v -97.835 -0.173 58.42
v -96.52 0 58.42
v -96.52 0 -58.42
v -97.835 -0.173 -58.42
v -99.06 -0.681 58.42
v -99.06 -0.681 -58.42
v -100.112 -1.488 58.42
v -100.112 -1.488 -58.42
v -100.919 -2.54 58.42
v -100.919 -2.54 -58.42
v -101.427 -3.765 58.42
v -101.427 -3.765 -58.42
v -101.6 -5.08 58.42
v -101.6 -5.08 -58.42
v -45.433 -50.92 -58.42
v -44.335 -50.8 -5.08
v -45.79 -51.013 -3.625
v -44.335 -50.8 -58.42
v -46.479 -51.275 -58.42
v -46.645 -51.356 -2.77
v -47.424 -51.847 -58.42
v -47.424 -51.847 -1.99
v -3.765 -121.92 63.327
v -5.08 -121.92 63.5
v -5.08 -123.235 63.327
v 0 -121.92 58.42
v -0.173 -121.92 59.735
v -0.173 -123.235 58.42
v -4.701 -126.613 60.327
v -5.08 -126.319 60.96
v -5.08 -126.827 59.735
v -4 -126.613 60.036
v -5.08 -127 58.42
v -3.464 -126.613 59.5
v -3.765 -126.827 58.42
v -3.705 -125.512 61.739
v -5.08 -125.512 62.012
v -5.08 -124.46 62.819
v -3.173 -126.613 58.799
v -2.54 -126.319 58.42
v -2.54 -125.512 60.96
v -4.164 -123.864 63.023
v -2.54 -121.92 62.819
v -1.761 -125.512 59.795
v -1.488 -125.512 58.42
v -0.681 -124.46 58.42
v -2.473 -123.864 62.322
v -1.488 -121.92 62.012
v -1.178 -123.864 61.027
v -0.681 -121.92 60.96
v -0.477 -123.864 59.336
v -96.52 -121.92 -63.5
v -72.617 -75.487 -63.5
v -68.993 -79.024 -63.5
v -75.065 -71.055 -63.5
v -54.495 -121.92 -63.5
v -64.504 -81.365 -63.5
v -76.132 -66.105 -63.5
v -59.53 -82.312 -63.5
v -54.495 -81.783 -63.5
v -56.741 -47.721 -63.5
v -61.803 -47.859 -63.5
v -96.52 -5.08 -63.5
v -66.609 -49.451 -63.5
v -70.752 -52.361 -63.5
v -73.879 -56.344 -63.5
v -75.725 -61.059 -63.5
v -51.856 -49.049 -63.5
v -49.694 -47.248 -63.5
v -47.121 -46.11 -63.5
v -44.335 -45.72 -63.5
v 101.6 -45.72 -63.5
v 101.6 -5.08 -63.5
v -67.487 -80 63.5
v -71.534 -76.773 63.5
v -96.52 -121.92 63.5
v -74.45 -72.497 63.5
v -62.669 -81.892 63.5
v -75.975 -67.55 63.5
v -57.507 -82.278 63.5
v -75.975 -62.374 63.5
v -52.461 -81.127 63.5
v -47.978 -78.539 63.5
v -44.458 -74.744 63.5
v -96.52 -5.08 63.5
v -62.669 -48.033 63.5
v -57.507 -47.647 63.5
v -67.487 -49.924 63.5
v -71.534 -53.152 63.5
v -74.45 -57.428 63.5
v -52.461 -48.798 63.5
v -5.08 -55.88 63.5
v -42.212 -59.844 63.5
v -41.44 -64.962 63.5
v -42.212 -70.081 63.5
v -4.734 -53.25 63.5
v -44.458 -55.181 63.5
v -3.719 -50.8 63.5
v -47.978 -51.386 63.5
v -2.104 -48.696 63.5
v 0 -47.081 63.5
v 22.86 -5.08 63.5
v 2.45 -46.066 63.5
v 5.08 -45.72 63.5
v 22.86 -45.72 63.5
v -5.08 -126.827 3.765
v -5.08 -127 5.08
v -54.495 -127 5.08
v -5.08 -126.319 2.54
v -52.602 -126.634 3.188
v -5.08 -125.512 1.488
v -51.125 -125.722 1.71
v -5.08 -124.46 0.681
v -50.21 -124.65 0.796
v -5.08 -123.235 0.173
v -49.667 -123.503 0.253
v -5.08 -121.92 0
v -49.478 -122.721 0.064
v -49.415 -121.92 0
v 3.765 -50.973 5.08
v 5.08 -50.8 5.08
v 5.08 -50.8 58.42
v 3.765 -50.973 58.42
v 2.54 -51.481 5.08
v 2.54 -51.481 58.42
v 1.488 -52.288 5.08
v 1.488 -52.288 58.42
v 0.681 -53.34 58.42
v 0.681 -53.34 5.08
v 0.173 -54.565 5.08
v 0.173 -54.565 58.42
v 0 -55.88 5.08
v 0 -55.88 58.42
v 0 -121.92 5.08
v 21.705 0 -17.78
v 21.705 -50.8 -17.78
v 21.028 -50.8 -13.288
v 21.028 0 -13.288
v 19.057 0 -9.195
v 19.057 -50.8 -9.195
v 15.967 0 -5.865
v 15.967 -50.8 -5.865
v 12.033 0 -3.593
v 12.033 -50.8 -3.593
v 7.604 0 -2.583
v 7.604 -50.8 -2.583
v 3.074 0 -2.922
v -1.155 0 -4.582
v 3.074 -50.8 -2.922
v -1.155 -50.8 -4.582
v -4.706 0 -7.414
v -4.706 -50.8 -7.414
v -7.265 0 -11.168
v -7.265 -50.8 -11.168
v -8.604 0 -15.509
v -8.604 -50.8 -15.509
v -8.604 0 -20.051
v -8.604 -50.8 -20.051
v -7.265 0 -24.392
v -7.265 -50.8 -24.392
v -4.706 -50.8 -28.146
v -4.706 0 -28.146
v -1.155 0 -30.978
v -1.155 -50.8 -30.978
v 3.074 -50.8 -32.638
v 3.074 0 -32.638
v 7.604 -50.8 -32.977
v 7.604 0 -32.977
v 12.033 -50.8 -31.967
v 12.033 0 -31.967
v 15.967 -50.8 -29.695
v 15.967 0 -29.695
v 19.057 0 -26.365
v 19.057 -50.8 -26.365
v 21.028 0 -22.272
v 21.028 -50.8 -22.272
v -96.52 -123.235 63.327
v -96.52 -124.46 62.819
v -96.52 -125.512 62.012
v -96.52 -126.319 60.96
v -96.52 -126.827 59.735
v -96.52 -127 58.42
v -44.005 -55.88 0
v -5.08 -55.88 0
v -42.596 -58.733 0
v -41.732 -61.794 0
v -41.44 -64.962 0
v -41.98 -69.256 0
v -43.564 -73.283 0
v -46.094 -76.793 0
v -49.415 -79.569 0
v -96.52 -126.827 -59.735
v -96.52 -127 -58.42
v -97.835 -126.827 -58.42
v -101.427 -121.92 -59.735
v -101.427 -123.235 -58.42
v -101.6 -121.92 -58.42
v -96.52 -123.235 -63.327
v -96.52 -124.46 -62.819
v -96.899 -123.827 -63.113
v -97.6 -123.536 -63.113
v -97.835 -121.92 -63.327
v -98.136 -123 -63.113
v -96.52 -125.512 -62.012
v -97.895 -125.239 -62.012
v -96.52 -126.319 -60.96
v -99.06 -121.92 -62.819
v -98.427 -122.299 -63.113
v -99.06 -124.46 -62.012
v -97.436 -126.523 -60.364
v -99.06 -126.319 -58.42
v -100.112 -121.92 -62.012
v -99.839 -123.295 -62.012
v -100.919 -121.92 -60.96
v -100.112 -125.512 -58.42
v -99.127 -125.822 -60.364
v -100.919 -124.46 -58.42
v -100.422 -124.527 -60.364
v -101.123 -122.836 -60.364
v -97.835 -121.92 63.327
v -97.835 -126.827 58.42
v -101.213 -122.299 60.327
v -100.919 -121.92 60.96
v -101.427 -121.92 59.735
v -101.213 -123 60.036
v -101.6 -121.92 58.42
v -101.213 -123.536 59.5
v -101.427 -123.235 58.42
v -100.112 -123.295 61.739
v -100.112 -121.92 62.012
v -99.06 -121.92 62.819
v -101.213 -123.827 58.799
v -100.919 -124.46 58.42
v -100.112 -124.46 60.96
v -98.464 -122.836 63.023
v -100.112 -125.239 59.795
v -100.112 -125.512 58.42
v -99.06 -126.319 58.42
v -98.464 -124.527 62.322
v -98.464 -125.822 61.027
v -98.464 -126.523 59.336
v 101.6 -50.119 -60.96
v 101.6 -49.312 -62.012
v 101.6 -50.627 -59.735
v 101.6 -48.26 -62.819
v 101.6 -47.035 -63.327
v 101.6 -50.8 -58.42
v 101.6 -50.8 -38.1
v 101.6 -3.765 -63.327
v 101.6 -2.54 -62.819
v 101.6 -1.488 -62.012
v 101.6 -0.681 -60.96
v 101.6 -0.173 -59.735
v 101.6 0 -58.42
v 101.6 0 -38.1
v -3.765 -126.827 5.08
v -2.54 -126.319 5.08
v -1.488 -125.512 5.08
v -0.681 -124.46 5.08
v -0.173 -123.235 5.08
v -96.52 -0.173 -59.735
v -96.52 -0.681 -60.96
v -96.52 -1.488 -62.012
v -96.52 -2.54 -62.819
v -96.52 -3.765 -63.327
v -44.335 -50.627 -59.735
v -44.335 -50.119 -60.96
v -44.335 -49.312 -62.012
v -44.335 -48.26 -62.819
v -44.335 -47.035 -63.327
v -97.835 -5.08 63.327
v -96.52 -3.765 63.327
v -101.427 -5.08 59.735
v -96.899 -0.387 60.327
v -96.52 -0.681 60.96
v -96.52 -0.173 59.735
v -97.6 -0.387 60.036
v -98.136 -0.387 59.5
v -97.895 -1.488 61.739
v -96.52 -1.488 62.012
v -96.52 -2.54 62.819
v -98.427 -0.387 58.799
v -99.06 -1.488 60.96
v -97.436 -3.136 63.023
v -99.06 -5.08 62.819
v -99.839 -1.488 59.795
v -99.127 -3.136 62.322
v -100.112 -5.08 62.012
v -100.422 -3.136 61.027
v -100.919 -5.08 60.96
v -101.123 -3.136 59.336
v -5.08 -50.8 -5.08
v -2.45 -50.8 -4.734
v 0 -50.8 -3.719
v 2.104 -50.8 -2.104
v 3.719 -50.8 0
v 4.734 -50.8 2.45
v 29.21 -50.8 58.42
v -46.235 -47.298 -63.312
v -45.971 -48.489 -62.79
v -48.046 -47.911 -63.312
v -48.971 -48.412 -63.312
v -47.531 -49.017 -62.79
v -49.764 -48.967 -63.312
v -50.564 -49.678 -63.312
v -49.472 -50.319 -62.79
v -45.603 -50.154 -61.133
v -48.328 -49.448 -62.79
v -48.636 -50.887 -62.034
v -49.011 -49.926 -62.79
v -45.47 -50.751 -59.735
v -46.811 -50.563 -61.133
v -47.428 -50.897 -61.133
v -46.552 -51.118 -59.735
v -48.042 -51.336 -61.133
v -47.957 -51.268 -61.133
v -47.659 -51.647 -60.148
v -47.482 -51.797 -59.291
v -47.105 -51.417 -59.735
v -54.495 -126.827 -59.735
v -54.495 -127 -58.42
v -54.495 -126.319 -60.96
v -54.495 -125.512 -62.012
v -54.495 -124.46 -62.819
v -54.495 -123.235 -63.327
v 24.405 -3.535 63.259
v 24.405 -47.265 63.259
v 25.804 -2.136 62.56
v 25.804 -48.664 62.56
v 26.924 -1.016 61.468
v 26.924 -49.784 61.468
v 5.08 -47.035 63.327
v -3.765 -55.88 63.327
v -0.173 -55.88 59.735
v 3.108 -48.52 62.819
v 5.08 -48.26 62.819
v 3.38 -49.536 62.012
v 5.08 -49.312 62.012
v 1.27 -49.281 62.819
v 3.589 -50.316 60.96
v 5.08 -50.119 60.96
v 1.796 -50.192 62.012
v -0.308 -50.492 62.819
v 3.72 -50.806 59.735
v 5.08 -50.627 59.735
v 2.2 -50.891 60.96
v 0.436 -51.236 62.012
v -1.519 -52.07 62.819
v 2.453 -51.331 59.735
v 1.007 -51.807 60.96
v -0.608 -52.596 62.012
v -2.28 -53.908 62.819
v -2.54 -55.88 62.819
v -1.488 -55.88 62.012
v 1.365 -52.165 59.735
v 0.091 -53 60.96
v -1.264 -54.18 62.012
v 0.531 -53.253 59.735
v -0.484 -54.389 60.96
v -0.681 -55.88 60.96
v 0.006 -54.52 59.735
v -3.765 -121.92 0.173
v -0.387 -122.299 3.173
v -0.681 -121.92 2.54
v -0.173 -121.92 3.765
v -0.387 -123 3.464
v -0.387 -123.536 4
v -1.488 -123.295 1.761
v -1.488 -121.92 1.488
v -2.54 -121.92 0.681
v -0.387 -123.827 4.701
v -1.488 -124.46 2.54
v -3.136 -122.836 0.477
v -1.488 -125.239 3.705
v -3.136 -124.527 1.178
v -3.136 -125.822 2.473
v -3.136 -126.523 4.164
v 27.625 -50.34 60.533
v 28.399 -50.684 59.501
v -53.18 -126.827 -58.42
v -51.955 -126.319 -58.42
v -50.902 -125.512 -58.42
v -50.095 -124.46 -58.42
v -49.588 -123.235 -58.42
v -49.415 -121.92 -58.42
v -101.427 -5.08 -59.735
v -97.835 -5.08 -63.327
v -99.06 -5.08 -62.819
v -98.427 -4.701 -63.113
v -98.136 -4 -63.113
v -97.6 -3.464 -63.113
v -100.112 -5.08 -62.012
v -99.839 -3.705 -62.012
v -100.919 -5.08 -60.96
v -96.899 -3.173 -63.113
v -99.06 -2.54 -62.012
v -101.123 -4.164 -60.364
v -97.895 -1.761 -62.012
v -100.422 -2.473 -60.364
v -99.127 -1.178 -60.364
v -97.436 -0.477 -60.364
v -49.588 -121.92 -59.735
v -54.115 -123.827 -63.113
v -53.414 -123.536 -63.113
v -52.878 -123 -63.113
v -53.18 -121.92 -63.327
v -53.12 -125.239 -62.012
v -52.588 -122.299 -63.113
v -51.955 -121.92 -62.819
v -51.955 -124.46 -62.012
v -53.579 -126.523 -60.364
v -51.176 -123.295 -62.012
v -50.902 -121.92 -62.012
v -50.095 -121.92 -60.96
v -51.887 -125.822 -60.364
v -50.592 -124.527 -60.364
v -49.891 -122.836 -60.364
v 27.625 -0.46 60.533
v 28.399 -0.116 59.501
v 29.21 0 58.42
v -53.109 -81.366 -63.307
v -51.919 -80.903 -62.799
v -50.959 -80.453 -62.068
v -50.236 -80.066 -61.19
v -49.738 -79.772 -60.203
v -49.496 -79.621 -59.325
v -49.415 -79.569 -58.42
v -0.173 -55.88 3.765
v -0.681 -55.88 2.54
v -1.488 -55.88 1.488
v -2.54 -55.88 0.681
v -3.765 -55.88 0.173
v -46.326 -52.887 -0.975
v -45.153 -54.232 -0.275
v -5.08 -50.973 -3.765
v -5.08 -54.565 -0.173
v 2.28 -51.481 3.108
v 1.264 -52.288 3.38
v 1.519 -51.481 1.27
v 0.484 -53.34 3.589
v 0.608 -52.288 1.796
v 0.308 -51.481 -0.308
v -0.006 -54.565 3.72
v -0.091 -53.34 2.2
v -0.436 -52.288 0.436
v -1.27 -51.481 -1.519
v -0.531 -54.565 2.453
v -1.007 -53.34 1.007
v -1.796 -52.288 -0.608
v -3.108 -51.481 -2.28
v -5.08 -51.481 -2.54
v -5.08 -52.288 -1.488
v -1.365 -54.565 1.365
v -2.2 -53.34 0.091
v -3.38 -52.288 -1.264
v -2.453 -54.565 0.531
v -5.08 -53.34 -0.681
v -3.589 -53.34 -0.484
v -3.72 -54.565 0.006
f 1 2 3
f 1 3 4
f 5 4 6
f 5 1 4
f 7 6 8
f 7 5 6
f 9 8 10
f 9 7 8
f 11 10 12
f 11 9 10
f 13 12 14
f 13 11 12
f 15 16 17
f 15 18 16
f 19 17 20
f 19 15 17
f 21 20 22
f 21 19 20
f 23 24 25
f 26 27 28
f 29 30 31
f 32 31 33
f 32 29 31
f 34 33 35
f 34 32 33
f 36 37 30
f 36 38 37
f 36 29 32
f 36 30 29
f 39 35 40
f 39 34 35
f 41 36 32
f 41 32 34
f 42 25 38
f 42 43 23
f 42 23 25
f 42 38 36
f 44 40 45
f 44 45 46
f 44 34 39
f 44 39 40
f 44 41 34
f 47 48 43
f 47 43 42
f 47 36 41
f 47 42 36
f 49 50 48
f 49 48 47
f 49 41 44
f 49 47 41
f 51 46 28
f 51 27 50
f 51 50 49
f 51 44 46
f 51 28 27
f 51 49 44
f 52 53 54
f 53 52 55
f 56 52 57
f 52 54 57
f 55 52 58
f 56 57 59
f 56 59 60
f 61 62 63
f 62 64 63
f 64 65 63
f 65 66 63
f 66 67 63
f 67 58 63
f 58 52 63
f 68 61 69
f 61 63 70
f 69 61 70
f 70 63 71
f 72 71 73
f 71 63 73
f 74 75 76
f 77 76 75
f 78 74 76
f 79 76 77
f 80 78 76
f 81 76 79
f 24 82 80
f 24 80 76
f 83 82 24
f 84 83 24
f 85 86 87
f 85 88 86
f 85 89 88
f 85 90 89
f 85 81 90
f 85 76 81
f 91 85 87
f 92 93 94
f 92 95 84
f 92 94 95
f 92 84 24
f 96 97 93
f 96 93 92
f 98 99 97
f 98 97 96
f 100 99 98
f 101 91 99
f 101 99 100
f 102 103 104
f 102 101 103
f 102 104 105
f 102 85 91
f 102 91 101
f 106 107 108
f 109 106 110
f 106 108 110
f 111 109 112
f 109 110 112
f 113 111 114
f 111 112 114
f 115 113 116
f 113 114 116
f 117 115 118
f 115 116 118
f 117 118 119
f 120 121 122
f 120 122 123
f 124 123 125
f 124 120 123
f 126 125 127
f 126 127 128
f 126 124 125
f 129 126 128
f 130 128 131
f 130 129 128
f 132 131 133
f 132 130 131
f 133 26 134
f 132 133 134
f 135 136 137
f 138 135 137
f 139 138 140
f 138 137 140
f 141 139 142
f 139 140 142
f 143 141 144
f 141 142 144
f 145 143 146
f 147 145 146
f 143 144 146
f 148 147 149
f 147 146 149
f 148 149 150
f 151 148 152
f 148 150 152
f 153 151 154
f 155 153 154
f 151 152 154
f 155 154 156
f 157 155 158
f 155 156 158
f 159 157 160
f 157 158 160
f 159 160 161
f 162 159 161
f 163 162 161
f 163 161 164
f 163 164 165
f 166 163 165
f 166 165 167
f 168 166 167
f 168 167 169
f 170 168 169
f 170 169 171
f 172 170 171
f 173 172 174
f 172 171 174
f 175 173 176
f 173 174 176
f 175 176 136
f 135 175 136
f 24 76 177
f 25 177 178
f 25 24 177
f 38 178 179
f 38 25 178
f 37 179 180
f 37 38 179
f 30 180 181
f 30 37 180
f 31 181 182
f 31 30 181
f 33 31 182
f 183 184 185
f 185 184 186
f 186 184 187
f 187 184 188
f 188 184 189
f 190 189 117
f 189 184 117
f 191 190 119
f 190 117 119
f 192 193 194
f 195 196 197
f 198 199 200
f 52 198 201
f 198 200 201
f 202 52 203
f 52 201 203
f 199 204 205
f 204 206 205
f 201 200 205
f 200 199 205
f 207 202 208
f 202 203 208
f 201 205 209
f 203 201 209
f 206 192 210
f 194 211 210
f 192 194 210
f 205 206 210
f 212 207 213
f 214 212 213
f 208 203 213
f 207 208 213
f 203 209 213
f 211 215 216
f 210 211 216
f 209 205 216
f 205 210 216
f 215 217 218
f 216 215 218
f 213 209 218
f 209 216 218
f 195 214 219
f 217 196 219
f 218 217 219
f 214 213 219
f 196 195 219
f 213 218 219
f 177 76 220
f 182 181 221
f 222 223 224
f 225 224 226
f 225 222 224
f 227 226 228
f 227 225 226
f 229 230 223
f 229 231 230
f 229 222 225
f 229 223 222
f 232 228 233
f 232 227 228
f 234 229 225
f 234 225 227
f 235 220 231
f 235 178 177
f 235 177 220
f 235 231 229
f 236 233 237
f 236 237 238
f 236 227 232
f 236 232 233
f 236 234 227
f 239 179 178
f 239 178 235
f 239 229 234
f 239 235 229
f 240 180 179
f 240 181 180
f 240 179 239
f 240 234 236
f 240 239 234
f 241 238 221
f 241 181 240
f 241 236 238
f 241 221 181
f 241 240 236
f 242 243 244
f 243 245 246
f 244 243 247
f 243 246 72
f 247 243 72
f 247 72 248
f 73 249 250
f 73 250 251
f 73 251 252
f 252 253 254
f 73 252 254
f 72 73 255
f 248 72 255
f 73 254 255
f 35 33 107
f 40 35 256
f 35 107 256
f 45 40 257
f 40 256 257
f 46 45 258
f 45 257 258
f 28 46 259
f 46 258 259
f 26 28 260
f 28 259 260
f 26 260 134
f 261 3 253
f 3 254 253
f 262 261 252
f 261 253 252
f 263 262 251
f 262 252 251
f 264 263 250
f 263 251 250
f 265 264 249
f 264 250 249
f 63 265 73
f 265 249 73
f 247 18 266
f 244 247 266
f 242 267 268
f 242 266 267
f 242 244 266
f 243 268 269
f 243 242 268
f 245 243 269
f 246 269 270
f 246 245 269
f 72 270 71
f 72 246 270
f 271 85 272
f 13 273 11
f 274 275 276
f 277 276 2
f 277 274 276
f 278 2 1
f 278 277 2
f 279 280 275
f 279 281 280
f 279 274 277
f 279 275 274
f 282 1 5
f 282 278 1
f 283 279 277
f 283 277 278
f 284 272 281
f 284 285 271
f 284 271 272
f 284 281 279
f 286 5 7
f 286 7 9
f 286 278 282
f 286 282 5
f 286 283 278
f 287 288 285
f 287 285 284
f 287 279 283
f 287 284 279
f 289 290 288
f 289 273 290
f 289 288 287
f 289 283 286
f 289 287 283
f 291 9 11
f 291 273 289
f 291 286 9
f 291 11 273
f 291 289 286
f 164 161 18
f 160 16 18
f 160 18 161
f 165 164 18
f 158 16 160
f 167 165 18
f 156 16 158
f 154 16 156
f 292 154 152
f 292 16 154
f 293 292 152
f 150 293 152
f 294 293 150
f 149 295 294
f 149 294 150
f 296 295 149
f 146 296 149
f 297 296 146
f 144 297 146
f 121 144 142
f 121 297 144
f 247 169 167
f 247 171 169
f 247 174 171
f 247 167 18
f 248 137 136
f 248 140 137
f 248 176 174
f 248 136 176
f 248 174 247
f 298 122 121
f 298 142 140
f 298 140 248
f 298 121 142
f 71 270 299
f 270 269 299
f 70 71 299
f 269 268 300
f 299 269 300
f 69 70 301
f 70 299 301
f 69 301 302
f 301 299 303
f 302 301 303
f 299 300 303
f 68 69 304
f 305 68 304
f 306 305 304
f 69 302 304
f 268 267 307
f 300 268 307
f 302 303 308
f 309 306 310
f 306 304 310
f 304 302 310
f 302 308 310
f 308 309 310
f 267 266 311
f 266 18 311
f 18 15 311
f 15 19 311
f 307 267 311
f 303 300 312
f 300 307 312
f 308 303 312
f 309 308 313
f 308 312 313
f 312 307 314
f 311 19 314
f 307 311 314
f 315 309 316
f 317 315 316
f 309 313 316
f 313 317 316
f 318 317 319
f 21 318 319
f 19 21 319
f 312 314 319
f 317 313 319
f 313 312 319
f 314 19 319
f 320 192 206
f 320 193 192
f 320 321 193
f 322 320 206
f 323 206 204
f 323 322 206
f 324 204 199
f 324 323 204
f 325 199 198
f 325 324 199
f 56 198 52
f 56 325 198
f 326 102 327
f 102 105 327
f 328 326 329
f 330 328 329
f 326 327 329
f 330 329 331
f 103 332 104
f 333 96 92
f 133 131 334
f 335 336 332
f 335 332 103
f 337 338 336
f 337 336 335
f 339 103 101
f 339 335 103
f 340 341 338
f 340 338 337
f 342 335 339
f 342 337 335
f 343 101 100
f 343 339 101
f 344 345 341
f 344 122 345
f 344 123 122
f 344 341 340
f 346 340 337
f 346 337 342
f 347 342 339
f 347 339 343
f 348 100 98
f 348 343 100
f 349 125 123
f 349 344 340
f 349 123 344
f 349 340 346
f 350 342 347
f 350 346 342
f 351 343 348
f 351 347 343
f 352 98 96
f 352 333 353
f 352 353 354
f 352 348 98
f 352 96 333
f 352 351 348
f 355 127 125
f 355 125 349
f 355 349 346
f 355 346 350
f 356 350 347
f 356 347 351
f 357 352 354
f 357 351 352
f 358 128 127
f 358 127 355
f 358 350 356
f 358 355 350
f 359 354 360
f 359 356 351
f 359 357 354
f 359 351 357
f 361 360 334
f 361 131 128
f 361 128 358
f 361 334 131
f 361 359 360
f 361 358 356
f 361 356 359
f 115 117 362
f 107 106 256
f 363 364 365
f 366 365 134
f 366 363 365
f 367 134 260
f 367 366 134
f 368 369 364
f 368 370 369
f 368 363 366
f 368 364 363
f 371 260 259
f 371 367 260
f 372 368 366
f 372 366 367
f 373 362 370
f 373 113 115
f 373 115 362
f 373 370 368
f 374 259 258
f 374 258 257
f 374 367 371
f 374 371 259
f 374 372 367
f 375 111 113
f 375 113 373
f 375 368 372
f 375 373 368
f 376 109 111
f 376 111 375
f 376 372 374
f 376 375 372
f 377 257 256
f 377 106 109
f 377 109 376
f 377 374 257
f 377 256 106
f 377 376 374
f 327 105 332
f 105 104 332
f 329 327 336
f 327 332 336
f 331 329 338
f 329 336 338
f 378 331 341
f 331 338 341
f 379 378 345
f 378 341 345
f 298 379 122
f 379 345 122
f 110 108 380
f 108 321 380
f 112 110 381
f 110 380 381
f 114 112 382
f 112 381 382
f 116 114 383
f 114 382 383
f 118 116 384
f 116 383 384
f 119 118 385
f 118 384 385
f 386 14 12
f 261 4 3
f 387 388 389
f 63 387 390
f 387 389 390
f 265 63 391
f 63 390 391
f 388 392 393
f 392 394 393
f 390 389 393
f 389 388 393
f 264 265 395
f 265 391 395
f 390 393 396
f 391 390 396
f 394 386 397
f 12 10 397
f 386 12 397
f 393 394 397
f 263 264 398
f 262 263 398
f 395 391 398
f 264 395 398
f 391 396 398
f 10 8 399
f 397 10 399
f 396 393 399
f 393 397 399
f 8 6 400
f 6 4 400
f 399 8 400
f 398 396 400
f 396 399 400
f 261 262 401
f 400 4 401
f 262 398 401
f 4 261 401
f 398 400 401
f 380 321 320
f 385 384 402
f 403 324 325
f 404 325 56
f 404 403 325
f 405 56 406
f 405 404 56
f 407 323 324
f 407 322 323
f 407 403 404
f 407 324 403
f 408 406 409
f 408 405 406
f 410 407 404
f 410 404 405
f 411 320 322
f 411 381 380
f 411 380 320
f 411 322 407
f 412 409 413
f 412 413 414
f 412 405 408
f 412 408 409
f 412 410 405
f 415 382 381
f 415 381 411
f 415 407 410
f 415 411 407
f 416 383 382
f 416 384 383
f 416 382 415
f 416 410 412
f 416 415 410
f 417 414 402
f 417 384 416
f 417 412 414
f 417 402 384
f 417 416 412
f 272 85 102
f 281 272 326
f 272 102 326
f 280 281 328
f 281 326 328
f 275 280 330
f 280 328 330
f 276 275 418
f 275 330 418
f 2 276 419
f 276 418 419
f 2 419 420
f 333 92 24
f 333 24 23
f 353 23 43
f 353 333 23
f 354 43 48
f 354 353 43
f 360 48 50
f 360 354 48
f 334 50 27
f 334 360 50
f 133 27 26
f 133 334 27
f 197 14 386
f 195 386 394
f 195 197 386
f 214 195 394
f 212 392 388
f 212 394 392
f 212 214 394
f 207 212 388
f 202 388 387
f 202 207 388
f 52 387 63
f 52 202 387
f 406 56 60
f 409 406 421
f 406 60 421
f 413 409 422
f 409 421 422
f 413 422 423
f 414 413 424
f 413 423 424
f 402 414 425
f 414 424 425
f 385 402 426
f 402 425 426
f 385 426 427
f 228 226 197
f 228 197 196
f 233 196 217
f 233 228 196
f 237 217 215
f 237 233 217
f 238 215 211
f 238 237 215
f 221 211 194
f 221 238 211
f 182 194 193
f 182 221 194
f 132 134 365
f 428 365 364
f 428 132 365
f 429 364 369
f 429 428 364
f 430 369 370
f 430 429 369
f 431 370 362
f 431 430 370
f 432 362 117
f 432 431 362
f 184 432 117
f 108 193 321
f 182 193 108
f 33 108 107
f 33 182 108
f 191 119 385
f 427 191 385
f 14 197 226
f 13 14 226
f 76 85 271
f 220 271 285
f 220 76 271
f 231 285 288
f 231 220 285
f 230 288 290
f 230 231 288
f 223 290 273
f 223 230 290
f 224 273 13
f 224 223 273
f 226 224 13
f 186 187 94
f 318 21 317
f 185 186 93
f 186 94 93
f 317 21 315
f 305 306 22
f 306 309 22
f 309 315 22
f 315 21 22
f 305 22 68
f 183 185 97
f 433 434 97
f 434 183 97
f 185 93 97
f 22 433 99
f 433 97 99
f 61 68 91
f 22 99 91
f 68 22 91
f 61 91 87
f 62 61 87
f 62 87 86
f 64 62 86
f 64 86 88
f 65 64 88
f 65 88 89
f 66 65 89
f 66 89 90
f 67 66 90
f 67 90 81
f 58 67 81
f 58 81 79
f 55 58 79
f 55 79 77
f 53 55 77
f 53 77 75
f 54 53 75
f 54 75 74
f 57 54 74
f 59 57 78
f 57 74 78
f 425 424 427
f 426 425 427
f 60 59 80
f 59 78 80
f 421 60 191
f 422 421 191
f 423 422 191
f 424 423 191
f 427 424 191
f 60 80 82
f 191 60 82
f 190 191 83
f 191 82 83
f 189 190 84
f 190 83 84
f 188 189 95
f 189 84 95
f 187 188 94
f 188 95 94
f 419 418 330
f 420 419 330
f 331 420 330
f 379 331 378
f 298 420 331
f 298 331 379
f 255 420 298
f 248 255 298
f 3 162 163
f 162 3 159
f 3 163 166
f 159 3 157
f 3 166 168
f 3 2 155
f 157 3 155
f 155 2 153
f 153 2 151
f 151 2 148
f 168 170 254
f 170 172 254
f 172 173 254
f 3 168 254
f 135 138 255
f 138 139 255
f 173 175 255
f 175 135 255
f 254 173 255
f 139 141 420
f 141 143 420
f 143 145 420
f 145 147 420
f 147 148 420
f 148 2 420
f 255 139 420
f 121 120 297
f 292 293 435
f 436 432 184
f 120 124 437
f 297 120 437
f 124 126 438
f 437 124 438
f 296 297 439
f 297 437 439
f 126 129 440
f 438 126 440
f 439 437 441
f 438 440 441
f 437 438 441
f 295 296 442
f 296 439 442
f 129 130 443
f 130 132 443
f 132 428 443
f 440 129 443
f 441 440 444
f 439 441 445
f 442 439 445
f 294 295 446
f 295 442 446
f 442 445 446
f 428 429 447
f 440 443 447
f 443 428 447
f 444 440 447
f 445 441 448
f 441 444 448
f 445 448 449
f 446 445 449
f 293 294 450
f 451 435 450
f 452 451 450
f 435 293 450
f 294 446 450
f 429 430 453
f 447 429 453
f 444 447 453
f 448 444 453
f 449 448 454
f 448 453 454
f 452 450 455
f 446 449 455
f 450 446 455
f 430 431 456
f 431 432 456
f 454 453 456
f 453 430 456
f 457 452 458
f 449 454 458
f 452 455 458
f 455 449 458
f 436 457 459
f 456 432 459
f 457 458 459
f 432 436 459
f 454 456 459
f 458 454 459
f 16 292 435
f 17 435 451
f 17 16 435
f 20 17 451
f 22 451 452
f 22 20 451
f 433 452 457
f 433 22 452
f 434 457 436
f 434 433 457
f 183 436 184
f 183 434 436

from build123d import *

# Parameters (mm, degrees)
F0_W     = 203.2
F0_H     = 127
F1_DEPTH = 127
F3_DEPTH = 76.2
F4_SIZE2 = 101.6
F4_SIZE  = 76.2
F5_R     = 5.08
F6_R     = 15.24
F7_DEPTH = 50.8
F8_R     = 17.3644725526
F9_DEPTH = 127


with BuildPart() as f1:
    # F0 (on Front) → F1 (new body)
    with BuildSketch(Plane.XZ):
        Rectangle(F0_W, F0_H)
    extrude(amount=F1_DEPTH)

    # F2 (on face) → F3 (cut)
    with BuildSketch(Plane.XZ.offset(127)):
        Polygon((101.6, 63.5), (0, 63.5), (0, 0), (-49.4145452976, 0), (-49.4145452976, -63.5), (101.6, -63.5), align=None)
    extrude(amount=-F3_DEPTH, mode=Mode.SUBTRACT)

    # F4
    f4_edges = [f1.edges().sort_by_distance(p)[0] for p in [
        (101.6, -25.4, 63.5),
    ]]
    f4_side = f1.faces().sort_by_distance((-21.771429, -52.614286, 63.5))[0]
    chamfer(f4_edges, length=F4_SIZE, length2=F4_SIZE2, reference=f4_side)

    # F5
    f5_edges = [f1.edges().sort_by_distance(p)[0] for p in [
        (25.4, -25.4, 63.5),
        (12.7, -50.8, 63.5),
        (0, -88.9, 63.5),
        (-50.8, -127, 63.5),
        (-101.6, -63.5, 63.5),
        (-38.1, 0, 63.5),
        (-101.6, -127, 0),
        (-49.414545, -127, -31.75),
        (-24.707273, -127, 0),
        (0, -88.9, 0),
        (0, -127, 31.75),
        (-75.507273, -127, -63.5),
        (0, -50.8, 31.75),
        (-101.6, 0, 0),
        (-101.6, -63.5, -63.5),
        (0, 0, -63.5),
        (26.092727, -50.8, -63.5),
        (-49.414545, -88.9, -63.5),
        (-49.414545, -50.8, -31.75),
        (-24.707273, -50.8, 0),
    ]]
    fillet(f5_edges, radius=F5_R)

    # F6 (on face) → F7 (cut, through all)
    with BuildSketch(Plane.XZ.offset(50.8)):
        with Locations((6.4654547024, -17.78)):
            Circle(F6_R)
    extrude(amount=-F7_DEPTH, mode=Mode.SUBTRACT)

    # F8 (on face) → F9 (cut, through all)
    with BuildSketch(Plane.XY.offset(63.5)):
        with Locations((-58.8048510253, -64.9624243379)):
            Circle(F8_R)
    extrude(amount=-F9_DEPTH, mode=Mode.SUBTRACT)


solid = f1.part
